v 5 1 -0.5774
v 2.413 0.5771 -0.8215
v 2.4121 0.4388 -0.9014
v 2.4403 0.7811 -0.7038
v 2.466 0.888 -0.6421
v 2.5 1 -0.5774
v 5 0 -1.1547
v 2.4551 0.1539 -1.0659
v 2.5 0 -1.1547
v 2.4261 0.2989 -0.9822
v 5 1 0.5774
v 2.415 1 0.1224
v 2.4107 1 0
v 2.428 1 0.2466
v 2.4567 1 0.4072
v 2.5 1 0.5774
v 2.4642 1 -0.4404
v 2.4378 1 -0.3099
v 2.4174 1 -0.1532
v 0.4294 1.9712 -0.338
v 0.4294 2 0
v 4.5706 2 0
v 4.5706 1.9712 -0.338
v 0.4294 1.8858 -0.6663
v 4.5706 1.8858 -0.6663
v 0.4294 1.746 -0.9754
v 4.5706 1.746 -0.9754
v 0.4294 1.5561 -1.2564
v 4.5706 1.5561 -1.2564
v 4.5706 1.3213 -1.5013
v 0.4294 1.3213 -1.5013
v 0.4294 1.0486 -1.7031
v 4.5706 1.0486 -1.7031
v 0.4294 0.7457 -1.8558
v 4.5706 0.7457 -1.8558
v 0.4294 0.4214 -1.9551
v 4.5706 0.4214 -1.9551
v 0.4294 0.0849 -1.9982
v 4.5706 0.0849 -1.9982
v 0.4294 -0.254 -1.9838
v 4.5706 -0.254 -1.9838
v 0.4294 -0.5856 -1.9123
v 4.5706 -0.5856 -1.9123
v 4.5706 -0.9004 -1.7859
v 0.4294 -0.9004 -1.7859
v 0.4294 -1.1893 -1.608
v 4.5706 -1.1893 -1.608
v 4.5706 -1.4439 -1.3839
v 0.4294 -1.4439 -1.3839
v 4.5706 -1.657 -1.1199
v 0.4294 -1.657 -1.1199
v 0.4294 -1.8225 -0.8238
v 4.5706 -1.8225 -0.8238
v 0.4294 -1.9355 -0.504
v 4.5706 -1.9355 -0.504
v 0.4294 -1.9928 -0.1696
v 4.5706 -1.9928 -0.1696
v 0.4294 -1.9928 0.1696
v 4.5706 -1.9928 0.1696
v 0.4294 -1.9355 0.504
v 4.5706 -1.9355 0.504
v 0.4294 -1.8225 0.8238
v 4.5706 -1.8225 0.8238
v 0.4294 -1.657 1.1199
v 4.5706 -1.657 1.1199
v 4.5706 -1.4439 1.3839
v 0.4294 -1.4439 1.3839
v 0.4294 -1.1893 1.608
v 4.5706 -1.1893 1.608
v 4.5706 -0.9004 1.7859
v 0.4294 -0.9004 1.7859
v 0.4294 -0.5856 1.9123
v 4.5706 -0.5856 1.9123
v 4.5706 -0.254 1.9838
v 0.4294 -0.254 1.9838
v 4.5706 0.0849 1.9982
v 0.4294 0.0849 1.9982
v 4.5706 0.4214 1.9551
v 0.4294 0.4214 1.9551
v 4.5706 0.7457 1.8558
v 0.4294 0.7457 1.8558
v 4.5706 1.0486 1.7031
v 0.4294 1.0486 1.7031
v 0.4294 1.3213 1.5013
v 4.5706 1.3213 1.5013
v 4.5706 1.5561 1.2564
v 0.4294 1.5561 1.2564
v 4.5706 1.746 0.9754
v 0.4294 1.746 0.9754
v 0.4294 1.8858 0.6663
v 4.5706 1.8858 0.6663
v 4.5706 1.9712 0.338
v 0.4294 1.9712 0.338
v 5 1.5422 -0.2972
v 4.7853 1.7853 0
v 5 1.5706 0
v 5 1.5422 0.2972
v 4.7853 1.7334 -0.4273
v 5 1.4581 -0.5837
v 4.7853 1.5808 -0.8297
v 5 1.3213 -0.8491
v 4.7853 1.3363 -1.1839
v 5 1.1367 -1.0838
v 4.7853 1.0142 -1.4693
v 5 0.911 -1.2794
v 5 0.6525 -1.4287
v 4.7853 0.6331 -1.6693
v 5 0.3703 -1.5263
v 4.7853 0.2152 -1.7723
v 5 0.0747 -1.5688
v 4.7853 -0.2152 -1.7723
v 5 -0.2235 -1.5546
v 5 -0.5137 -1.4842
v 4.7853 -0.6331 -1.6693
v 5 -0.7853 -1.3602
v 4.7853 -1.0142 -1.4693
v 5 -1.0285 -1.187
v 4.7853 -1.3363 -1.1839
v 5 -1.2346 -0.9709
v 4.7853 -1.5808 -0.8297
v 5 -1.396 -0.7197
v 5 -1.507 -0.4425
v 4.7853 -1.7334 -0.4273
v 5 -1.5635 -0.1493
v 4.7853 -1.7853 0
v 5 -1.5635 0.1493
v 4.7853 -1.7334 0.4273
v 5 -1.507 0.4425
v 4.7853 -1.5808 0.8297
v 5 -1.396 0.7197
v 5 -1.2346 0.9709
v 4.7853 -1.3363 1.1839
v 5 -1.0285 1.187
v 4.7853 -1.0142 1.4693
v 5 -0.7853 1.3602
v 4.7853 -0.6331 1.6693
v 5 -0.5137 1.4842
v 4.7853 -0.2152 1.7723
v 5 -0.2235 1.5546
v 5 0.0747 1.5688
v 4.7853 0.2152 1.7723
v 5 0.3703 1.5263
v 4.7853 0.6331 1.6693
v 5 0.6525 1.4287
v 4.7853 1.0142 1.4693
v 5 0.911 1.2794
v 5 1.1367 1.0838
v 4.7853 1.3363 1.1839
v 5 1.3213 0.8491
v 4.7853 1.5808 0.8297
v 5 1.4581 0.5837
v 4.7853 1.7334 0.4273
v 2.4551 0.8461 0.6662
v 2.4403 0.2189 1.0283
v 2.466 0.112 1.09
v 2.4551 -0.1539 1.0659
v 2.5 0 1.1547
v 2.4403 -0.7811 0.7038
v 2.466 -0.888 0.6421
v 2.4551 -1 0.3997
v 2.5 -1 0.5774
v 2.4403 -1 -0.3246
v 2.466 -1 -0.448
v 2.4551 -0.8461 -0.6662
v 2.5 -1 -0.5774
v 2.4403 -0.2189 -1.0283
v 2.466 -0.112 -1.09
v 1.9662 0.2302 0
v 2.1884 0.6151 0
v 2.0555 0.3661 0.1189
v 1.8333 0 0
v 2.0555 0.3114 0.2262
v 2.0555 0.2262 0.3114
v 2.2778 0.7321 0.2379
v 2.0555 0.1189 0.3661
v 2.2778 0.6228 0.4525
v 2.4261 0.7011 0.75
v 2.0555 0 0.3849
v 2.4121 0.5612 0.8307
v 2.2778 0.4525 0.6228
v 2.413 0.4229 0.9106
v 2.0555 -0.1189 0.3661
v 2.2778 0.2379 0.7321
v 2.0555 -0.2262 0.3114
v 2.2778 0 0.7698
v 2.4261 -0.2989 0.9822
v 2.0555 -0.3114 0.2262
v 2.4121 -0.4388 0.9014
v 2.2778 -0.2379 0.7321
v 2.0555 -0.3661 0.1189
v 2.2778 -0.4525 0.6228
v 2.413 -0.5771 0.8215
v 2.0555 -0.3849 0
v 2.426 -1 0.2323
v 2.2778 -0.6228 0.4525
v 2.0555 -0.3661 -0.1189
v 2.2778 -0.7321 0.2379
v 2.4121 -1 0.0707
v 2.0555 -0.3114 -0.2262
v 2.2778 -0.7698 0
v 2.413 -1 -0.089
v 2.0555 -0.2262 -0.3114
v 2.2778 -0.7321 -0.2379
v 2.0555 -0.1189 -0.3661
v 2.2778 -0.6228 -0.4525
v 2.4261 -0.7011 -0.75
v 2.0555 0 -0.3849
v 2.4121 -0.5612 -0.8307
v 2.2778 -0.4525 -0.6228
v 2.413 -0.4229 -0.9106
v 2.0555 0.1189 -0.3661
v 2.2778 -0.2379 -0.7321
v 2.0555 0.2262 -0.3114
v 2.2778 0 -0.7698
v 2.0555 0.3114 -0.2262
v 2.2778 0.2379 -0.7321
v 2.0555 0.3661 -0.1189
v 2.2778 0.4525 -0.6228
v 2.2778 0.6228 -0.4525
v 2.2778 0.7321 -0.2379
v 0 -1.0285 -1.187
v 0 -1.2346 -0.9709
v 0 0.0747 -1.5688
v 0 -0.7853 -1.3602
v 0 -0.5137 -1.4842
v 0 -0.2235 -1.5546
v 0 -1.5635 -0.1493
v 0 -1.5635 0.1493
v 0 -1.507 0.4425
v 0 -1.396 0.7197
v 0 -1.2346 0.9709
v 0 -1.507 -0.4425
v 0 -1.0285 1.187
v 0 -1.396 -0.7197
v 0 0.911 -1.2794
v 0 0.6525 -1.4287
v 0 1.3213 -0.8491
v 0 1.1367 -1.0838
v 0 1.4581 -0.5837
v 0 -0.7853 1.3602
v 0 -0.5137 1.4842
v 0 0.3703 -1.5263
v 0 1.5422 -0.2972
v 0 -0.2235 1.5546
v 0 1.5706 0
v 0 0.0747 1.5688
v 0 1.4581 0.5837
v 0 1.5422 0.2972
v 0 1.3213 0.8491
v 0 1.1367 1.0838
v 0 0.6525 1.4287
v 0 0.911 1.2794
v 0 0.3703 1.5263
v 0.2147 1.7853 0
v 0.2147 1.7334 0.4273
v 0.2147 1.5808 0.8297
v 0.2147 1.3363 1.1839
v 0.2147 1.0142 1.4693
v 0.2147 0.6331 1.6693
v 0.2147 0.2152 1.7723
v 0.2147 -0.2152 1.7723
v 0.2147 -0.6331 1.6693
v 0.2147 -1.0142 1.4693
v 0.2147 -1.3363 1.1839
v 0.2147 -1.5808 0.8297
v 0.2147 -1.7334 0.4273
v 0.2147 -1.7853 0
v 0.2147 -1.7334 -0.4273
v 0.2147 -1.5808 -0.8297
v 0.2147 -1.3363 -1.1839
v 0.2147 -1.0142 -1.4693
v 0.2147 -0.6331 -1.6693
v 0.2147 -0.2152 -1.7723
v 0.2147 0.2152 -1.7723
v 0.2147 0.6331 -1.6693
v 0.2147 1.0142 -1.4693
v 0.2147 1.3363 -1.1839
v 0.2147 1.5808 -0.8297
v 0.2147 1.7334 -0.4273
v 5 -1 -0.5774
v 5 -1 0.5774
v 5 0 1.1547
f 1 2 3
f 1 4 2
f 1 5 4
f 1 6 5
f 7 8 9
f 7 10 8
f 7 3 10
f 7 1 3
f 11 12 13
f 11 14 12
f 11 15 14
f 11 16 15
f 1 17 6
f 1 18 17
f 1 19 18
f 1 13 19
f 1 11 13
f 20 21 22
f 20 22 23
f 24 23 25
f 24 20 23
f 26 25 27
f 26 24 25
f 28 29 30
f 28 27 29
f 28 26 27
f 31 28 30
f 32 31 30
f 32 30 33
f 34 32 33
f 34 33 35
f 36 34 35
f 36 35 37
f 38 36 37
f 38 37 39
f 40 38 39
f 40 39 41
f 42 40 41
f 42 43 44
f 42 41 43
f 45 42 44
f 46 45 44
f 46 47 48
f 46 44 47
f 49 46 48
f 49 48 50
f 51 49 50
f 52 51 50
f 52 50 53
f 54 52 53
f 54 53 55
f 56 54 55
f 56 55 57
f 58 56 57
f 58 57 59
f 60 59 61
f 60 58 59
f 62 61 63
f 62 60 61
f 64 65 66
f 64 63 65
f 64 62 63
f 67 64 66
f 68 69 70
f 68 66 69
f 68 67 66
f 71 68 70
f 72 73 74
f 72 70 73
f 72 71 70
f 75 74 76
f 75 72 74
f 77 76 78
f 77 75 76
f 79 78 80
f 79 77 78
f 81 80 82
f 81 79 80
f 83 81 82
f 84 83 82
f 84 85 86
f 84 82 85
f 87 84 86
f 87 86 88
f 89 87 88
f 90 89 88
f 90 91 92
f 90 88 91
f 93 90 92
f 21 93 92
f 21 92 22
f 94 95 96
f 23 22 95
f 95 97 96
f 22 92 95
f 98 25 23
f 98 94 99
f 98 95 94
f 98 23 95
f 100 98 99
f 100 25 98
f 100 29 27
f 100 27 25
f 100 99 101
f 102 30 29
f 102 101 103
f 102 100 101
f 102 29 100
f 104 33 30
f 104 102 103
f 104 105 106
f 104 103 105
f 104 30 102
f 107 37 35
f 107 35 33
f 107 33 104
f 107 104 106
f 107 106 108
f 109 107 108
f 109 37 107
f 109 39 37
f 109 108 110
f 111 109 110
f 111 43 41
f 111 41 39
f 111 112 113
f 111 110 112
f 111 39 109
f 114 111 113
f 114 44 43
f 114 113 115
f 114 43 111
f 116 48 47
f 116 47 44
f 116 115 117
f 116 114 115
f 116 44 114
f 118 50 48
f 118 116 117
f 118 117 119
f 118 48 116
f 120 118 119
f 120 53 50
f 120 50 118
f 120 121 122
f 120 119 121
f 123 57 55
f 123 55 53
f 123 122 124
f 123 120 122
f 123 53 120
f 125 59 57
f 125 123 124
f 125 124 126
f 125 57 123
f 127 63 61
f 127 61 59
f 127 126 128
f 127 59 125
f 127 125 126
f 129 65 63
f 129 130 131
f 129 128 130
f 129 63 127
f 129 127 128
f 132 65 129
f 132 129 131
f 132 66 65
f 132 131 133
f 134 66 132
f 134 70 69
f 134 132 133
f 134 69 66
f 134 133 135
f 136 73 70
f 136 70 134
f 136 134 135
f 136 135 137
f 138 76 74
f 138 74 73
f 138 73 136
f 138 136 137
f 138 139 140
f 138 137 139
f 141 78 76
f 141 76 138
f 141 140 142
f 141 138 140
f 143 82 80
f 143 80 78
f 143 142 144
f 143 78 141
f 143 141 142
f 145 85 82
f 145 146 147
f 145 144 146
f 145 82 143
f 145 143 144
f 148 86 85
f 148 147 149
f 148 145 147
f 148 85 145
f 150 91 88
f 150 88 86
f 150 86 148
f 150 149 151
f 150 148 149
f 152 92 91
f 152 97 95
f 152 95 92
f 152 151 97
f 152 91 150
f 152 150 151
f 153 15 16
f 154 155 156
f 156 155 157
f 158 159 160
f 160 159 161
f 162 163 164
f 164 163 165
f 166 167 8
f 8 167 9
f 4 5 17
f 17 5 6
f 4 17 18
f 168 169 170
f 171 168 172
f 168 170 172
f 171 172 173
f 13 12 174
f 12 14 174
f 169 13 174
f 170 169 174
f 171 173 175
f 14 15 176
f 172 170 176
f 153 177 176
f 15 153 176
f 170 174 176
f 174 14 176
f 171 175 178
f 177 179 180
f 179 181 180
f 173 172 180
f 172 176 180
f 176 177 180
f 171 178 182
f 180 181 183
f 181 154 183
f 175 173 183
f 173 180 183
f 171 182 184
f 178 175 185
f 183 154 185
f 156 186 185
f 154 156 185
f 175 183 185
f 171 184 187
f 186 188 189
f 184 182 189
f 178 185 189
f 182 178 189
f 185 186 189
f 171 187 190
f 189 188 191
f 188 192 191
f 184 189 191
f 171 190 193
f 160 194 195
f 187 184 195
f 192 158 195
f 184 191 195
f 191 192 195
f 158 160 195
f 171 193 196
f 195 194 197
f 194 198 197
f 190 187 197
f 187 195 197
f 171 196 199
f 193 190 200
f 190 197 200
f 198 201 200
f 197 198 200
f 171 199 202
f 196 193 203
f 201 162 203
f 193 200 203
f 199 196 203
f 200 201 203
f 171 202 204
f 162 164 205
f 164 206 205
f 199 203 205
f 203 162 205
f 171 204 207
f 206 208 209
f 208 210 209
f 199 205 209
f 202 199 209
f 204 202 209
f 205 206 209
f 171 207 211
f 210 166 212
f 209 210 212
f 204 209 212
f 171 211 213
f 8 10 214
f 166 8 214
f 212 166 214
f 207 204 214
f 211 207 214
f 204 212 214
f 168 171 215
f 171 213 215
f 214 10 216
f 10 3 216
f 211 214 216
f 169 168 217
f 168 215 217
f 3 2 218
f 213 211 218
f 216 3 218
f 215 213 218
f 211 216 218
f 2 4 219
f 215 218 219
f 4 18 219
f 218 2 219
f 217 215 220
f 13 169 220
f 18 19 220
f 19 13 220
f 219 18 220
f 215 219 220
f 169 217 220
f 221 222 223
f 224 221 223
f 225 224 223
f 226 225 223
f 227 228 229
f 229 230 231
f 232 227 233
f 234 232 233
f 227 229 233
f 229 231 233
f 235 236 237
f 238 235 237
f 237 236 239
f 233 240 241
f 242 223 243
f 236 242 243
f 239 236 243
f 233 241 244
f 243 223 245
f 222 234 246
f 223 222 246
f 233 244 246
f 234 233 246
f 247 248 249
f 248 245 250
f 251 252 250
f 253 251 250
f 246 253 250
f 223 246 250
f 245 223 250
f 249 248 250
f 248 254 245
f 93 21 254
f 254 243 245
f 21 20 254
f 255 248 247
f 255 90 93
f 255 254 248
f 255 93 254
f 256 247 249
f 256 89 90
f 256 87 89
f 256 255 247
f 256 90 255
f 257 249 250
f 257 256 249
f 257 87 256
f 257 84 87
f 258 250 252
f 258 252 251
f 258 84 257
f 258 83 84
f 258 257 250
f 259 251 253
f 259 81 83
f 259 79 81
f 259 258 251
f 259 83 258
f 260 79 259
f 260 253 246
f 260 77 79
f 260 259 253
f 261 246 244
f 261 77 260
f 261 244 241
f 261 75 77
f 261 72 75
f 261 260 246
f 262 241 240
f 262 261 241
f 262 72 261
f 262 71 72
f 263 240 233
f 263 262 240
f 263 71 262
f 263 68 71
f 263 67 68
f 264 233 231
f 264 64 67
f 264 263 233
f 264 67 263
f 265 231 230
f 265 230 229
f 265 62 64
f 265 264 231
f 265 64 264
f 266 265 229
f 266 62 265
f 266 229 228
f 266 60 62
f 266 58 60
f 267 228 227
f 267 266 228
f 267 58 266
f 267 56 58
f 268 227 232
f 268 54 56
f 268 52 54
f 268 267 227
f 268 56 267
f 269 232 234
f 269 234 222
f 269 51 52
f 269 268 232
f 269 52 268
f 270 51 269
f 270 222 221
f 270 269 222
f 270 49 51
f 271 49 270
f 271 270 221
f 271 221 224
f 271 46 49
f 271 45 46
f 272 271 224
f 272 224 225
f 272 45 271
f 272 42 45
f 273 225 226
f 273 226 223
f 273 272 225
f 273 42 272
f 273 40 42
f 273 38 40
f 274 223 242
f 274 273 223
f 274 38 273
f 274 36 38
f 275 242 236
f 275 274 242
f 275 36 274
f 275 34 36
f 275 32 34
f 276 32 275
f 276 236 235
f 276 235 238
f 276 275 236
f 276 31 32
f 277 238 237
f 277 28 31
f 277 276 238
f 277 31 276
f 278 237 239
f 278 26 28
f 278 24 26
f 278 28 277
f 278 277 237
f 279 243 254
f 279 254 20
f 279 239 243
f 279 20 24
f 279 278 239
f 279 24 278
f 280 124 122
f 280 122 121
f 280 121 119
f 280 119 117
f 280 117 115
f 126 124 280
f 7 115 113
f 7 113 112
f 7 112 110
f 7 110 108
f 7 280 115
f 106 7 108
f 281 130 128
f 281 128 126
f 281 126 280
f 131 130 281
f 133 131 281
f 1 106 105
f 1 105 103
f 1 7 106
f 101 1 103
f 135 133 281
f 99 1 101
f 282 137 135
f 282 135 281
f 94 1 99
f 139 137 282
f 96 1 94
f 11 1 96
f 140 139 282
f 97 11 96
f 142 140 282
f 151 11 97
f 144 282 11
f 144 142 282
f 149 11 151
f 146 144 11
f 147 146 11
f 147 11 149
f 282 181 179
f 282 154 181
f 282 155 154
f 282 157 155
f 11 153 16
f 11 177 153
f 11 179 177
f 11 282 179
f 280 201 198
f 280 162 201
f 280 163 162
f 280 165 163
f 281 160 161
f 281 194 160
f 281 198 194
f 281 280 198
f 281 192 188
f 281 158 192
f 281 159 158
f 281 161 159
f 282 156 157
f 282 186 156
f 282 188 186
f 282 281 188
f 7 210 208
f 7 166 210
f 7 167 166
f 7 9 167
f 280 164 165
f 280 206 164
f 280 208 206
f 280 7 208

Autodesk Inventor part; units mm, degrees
ref_plane "YZ Plane" through (0, 0, 0) normal (1, 0, 0) x (0, 1, 0)
ref_plane "XZ Plane" through (0, 0, 0) normal (0, 1, 0) x (-1, 0, 0)
sketch "Sketch1" plane through (0, 0, 0) normal (0, 0, 1) x (1, 0, 0)
  line L0 (0, 0) -> (1.8333, 0)
  line L1 (5, 1.1547) -> (5, 2)
  line L2 (5, 2) -> (0, 2)
  line L3 (5, 1.1547) -> (2.5, 1.1547)
  line L4 (2.5, 1.1547) -> (1.8333, 0)
  line L5 (0, -0.4) -> (0, 2.4) projected
  line L6 (0, 2) -> (0, 0)
  dimension "d0" = 2.5
  dimension "d1" = 60
  dimension "d2" = 4
  dimension "d3" = 2.3094
  dimension "d5" = 5
revolve "Body" add sketch "Sketch1" angle 360 about axis through (0, 0, 0) along (1, 0, 0)
chamfer "Chamfer1" distance 0.4294 angle 45 1 edges at (5, -2, 0) measured on face at (5, 1.6877, -0.2517)
sketch "Sketch2" plane through (5, 0, 0) normal (1, 0, 0) x (0, 0, -1)
  circle A0 centre (0, 0) radius 1.1547 projected
  line L0 (-0.5774, 1) -> (0.5774, 1)
  line L1 (0.5774, 1) -> (1.1547, 0)
  line L2 (1.1547, 0) -> (0.5774, -1)
  line L3 (0.5774, -1) -> (-0.5774, -1)
  line L4 (-0.5774, -1) -> (-1.1547, 0)
  line L5 (-1.1547, 0) -> (-0.5774, 1)
  point P0 (0, 0)
  point P1 (0, 0)
extrude "Slot" add sketch "Sketch2" against normal up to next contours L1 A0 | A0 L2 | L0 A0 | A0 L3 | L5 A0 | A0 L4
thread "Thread" size "M4x0.7" class "6g" standard "ISO Metric profile" length 5
chamfer "Chamfer2" distance 0.4294 angle 45 1 edges at (0, -2, 0) measured on face at (1.5235, 1.9741, -0.3208)
ref_plane "Work Plane1" through (2.5, 0, 0) normal (0, 0.5, 0.866) x (1, 0, 0)
equation "\"d0\" = INTI"
equation "\"d2\" = NND"
equation "\"d3\" = 1.1547 * SW"
equation "\"d5\" = NLG"
equation "\"d7\" = -0.5 * GD1 + 0.5 * NND"
equation "\"d8\" = FAWI"
equation "\"d29\" = -0.5 * GD1 + 0.5 * NND"
equation "\"d11\" = NLG"
equation "\"d13\" = -0.5 * GD1 + 0.5 * NND"
equation "\"d14\" = FAWI"
equation "\"d30\" = -0.5 * GD1 + 0.5 * NND"
equation "\"NND\" = 4"
equation "\"NLG\" = 5"
equation "\"INTI\" = 2.5"
equation "\"FAWI\" = 45deg"
equation "\"SW\" = 2"
equation "\"GD1\" = THREADDIA - 1.2269 * PTC"
equation "\"FAWI1\" = 45deg"
equation "\"GUL\" = 0.61345 * PTC"
equation "\"SPD\" = 2.5"
equation "\"SEWI\" = 90deg"
equation "\"TOA\" = 30deg"
equation "\"THREADDIA\" = 4"
equation "\"PTC\" = 0.7"
equation "\"GAL\" = 0.61345 * PTC"
equation "\"E0\" = 1.155 * SW"
properties part number "ISO 4026 - M4 x 5" material "Steel"
